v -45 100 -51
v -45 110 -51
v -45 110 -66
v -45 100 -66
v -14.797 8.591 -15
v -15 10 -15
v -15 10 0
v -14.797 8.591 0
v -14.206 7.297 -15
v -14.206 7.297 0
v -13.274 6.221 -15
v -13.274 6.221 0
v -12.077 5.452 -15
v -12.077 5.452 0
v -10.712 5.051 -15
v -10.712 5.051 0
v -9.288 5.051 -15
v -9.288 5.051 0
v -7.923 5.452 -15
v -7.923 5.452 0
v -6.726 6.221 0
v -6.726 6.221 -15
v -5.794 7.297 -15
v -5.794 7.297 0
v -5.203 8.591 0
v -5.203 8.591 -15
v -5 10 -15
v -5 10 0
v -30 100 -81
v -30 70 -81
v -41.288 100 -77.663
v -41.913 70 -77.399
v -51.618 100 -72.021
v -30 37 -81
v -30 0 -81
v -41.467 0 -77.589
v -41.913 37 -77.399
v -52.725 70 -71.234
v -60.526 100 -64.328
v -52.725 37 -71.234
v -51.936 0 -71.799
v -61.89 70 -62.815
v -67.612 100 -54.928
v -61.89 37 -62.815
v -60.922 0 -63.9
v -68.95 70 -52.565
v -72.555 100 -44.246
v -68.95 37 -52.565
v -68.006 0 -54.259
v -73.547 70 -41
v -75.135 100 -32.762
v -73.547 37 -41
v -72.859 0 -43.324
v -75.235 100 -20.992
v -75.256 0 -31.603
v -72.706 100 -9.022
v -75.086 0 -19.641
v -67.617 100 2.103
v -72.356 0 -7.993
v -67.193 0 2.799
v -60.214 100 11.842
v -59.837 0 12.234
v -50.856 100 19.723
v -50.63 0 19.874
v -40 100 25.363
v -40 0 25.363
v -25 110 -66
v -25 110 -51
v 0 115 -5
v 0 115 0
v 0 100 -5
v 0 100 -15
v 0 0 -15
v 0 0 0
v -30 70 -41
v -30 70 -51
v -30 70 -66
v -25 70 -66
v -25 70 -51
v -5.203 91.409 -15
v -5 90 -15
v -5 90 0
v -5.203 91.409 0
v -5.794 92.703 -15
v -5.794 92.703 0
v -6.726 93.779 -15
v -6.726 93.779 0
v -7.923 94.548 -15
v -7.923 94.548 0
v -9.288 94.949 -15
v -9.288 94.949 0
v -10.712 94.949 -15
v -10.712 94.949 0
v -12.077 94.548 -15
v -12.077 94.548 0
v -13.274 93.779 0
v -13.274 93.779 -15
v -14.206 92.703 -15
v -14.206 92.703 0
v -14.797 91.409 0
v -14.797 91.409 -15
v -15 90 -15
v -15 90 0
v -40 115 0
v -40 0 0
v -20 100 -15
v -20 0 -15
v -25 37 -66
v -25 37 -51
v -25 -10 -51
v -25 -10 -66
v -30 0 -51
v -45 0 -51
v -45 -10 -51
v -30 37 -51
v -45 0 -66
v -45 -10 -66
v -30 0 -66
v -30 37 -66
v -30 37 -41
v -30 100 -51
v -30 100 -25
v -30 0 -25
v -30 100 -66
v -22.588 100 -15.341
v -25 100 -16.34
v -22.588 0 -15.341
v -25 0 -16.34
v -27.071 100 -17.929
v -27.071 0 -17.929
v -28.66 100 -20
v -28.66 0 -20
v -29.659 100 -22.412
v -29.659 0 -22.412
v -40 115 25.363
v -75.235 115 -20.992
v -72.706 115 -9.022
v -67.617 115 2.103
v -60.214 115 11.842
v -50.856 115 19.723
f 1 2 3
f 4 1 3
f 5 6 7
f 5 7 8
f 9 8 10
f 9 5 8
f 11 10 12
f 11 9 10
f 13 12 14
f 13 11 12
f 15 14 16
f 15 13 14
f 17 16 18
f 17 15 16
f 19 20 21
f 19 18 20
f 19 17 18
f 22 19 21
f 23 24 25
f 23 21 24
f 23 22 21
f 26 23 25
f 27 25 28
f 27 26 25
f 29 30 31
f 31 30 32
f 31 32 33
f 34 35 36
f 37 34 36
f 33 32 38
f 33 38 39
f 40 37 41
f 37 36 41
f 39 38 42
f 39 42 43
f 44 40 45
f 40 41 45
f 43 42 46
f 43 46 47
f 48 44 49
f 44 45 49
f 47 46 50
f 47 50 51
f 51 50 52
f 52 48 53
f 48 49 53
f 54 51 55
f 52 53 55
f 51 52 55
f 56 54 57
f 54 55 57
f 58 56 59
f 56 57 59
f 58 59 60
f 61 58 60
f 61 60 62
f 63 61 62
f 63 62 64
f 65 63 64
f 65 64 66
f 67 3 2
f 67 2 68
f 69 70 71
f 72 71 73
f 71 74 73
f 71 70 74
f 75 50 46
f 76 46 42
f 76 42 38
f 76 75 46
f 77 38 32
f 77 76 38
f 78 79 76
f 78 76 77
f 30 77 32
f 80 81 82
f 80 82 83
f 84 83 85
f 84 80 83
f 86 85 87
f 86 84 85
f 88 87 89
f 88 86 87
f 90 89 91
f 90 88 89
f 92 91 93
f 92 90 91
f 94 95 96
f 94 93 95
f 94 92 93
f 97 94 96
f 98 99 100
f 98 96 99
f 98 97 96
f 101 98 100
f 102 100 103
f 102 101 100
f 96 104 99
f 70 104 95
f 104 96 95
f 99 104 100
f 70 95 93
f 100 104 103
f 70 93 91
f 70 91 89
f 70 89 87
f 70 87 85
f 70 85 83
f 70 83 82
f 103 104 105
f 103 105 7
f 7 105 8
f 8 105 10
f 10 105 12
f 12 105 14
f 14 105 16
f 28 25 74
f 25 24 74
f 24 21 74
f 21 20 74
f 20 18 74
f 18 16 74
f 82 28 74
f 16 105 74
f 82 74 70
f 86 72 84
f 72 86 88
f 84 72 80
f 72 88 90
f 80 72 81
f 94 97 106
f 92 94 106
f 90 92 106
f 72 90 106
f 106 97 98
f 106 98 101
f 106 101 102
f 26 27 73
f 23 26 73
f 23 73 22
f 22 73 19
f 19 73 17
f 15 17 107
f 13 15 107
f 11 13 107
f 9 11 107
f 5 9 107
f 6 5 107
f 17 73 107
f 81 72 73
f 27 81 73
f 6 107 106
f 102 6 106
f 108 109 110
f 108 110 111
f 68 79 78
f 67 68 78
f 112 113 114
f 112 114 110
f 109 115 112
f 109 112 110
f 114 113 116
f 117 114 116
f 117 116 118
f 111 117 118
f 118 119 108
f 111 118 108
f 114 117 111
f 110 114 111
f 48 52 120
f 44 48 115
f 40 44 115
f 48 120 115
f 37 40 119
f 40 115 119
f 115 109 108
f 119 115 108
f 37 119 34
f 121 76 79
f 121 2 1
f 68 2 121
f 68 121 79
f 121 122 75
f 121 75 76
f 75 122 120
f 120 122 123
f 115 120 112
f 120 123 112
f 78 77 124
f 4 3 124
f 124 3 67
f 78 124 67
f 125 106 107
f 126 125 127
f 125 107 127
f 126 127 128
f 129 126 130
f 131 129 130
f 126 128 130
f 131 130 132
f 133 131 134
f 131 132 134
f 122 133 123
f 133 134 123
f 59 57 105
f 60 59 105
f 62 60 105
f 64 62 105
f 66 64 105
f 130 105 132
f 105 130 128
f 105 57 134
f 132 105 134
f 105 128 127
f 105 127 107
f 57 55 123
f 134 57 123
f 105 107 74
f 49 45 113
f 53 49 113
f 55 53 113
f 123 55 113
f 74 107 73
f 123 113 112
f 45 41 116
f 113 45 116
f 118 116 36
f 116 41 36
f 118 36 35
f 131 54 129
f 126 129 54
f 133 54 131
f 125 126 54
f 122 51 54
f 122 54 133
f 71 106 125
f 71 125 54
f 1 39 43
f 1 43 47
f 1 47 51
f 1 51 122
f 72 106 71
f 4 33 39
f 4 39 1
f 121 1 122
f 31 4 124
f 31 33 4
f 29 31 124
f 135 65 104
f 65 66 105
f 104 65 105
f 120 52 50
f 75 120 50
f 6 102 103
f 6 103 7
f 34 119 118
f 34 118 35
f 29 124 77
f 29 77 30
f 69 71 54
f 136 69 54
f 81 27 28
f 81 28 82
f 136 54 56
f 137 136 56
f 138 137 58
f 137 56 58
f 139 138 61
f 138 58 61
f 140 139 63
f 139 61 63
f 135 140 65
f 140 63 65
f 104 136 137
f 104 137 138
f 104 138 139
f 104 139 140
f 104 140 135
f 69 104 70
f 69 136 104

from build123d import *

# Parameters (mm, degrees)
BOSS_EXTRUDE1_DEPTH = 100
BOSS_EXTRUDE2_DEPTH = 15
SKETCH3_W           = 20
SKETCH3_H           = 15
BOSS_EXTRUDE3_DEPTH = 60
SKETCH4_W           = 40
SKETCH4_H           = 33
CUT_EXTRUDE1_DEPTH  = 119.5
CUT_EXTRUDE2_DEPTH  = 119.5


with BuildPart() as part:
    # Sketch1 → Boss-Extrude1 (new body)
    with BuildSketch(Plane(origin=(0, 0, 0), x_dir=(1, 0, 0), z_dir=(0, 1, 0))):
        with BuildLine():
            Line((0, 0), (0, 15))
            Line((0, 15), (-20, 15))
            ThreePointArc((-20, 15), (-27.071067812, 17.928932188), (-30, 25))
            Line((-30, 25), (-30, 81))
            ThreePointArc((-30, 81), (-75.256322222, 31.603413808), (-40, -25.362796982))
            Line((-40, -25.362796982), (-40, 0))
            Line((-40, 0), (0, 0))
        make_face()
    extrude(amount=BOSS_EXTRUDE1_DEPTH)

    # Sketch2 → Boss-Extrude2 (add)
    with BuildSketch(Plane(origin=(0, 100, 0), x_dir=(1, 0, 0), z_dir=(0, 1, 0))):
        with BuildLine():
            Line((0, 5), (-75.235044142, 20.9917023))
            ThreePointArc((-75.235044142, 20.9917023), (-64.184418834, -7.177185713), (-40, -25.362796982))
            Line((-40, -25.362796982), (-40, 0))
            Line((-40, 0), (0, 0))
            Line((0, 0), (0, 5))
        make_face()
    extrude(amount=BOSS_EXTRUDE2_DEPTH)

    # Sketch3 → Boss-Extrude3 (add, symmetric)
    with BuildSketch(Plane(origin=(0, 50, 0), x_dir=(1, 0, 0), z_dir=(0, 1, 0))):
        with Locations((-35, 58.5)):
            Rectangle(SKETCH3_W, SKETCH3_H)
    extrude(amount=BOSS_EXTRUDE3_DEPTH, both=True)

    # Sketch4 → Cut-Extrude1 (cut, symmetric)
    with BuildSketch(Plane(origin=(0, 0, 0), x_dir=(0, 0, -1), z_dir=(1, 0, 0))):
        with Locations((61, 53.5)):
            Rectangle(SKETCH4_W, SKETCH4_H)
    extrude(amount=CUT_EXTRUDE1_DEPTH, both=True, mode=Mode.SUBTRACT)

    # Sketch5 → Cut-Extrude2 (cut, symmetric)
    with BuildSketch(Plane(origin=(0, 0, -15), x_dir=(-1, 0, 0), z_dir=(0, 0, -1))):
        with BuildLine():
            Line((15, 90), (15, 10))
            ThreePointArc((15, 10), (10, 5), (5, 10))
            Line((5, 10), (5, 90))
            ThreePointArc((5, 90), (10, 95), (15, 90))
        make_face()
    extrude(amount=CUT_EXTRUDE2_DEPTH, both=True, mode=Mode.SUBTRACT)


solid = part.part
